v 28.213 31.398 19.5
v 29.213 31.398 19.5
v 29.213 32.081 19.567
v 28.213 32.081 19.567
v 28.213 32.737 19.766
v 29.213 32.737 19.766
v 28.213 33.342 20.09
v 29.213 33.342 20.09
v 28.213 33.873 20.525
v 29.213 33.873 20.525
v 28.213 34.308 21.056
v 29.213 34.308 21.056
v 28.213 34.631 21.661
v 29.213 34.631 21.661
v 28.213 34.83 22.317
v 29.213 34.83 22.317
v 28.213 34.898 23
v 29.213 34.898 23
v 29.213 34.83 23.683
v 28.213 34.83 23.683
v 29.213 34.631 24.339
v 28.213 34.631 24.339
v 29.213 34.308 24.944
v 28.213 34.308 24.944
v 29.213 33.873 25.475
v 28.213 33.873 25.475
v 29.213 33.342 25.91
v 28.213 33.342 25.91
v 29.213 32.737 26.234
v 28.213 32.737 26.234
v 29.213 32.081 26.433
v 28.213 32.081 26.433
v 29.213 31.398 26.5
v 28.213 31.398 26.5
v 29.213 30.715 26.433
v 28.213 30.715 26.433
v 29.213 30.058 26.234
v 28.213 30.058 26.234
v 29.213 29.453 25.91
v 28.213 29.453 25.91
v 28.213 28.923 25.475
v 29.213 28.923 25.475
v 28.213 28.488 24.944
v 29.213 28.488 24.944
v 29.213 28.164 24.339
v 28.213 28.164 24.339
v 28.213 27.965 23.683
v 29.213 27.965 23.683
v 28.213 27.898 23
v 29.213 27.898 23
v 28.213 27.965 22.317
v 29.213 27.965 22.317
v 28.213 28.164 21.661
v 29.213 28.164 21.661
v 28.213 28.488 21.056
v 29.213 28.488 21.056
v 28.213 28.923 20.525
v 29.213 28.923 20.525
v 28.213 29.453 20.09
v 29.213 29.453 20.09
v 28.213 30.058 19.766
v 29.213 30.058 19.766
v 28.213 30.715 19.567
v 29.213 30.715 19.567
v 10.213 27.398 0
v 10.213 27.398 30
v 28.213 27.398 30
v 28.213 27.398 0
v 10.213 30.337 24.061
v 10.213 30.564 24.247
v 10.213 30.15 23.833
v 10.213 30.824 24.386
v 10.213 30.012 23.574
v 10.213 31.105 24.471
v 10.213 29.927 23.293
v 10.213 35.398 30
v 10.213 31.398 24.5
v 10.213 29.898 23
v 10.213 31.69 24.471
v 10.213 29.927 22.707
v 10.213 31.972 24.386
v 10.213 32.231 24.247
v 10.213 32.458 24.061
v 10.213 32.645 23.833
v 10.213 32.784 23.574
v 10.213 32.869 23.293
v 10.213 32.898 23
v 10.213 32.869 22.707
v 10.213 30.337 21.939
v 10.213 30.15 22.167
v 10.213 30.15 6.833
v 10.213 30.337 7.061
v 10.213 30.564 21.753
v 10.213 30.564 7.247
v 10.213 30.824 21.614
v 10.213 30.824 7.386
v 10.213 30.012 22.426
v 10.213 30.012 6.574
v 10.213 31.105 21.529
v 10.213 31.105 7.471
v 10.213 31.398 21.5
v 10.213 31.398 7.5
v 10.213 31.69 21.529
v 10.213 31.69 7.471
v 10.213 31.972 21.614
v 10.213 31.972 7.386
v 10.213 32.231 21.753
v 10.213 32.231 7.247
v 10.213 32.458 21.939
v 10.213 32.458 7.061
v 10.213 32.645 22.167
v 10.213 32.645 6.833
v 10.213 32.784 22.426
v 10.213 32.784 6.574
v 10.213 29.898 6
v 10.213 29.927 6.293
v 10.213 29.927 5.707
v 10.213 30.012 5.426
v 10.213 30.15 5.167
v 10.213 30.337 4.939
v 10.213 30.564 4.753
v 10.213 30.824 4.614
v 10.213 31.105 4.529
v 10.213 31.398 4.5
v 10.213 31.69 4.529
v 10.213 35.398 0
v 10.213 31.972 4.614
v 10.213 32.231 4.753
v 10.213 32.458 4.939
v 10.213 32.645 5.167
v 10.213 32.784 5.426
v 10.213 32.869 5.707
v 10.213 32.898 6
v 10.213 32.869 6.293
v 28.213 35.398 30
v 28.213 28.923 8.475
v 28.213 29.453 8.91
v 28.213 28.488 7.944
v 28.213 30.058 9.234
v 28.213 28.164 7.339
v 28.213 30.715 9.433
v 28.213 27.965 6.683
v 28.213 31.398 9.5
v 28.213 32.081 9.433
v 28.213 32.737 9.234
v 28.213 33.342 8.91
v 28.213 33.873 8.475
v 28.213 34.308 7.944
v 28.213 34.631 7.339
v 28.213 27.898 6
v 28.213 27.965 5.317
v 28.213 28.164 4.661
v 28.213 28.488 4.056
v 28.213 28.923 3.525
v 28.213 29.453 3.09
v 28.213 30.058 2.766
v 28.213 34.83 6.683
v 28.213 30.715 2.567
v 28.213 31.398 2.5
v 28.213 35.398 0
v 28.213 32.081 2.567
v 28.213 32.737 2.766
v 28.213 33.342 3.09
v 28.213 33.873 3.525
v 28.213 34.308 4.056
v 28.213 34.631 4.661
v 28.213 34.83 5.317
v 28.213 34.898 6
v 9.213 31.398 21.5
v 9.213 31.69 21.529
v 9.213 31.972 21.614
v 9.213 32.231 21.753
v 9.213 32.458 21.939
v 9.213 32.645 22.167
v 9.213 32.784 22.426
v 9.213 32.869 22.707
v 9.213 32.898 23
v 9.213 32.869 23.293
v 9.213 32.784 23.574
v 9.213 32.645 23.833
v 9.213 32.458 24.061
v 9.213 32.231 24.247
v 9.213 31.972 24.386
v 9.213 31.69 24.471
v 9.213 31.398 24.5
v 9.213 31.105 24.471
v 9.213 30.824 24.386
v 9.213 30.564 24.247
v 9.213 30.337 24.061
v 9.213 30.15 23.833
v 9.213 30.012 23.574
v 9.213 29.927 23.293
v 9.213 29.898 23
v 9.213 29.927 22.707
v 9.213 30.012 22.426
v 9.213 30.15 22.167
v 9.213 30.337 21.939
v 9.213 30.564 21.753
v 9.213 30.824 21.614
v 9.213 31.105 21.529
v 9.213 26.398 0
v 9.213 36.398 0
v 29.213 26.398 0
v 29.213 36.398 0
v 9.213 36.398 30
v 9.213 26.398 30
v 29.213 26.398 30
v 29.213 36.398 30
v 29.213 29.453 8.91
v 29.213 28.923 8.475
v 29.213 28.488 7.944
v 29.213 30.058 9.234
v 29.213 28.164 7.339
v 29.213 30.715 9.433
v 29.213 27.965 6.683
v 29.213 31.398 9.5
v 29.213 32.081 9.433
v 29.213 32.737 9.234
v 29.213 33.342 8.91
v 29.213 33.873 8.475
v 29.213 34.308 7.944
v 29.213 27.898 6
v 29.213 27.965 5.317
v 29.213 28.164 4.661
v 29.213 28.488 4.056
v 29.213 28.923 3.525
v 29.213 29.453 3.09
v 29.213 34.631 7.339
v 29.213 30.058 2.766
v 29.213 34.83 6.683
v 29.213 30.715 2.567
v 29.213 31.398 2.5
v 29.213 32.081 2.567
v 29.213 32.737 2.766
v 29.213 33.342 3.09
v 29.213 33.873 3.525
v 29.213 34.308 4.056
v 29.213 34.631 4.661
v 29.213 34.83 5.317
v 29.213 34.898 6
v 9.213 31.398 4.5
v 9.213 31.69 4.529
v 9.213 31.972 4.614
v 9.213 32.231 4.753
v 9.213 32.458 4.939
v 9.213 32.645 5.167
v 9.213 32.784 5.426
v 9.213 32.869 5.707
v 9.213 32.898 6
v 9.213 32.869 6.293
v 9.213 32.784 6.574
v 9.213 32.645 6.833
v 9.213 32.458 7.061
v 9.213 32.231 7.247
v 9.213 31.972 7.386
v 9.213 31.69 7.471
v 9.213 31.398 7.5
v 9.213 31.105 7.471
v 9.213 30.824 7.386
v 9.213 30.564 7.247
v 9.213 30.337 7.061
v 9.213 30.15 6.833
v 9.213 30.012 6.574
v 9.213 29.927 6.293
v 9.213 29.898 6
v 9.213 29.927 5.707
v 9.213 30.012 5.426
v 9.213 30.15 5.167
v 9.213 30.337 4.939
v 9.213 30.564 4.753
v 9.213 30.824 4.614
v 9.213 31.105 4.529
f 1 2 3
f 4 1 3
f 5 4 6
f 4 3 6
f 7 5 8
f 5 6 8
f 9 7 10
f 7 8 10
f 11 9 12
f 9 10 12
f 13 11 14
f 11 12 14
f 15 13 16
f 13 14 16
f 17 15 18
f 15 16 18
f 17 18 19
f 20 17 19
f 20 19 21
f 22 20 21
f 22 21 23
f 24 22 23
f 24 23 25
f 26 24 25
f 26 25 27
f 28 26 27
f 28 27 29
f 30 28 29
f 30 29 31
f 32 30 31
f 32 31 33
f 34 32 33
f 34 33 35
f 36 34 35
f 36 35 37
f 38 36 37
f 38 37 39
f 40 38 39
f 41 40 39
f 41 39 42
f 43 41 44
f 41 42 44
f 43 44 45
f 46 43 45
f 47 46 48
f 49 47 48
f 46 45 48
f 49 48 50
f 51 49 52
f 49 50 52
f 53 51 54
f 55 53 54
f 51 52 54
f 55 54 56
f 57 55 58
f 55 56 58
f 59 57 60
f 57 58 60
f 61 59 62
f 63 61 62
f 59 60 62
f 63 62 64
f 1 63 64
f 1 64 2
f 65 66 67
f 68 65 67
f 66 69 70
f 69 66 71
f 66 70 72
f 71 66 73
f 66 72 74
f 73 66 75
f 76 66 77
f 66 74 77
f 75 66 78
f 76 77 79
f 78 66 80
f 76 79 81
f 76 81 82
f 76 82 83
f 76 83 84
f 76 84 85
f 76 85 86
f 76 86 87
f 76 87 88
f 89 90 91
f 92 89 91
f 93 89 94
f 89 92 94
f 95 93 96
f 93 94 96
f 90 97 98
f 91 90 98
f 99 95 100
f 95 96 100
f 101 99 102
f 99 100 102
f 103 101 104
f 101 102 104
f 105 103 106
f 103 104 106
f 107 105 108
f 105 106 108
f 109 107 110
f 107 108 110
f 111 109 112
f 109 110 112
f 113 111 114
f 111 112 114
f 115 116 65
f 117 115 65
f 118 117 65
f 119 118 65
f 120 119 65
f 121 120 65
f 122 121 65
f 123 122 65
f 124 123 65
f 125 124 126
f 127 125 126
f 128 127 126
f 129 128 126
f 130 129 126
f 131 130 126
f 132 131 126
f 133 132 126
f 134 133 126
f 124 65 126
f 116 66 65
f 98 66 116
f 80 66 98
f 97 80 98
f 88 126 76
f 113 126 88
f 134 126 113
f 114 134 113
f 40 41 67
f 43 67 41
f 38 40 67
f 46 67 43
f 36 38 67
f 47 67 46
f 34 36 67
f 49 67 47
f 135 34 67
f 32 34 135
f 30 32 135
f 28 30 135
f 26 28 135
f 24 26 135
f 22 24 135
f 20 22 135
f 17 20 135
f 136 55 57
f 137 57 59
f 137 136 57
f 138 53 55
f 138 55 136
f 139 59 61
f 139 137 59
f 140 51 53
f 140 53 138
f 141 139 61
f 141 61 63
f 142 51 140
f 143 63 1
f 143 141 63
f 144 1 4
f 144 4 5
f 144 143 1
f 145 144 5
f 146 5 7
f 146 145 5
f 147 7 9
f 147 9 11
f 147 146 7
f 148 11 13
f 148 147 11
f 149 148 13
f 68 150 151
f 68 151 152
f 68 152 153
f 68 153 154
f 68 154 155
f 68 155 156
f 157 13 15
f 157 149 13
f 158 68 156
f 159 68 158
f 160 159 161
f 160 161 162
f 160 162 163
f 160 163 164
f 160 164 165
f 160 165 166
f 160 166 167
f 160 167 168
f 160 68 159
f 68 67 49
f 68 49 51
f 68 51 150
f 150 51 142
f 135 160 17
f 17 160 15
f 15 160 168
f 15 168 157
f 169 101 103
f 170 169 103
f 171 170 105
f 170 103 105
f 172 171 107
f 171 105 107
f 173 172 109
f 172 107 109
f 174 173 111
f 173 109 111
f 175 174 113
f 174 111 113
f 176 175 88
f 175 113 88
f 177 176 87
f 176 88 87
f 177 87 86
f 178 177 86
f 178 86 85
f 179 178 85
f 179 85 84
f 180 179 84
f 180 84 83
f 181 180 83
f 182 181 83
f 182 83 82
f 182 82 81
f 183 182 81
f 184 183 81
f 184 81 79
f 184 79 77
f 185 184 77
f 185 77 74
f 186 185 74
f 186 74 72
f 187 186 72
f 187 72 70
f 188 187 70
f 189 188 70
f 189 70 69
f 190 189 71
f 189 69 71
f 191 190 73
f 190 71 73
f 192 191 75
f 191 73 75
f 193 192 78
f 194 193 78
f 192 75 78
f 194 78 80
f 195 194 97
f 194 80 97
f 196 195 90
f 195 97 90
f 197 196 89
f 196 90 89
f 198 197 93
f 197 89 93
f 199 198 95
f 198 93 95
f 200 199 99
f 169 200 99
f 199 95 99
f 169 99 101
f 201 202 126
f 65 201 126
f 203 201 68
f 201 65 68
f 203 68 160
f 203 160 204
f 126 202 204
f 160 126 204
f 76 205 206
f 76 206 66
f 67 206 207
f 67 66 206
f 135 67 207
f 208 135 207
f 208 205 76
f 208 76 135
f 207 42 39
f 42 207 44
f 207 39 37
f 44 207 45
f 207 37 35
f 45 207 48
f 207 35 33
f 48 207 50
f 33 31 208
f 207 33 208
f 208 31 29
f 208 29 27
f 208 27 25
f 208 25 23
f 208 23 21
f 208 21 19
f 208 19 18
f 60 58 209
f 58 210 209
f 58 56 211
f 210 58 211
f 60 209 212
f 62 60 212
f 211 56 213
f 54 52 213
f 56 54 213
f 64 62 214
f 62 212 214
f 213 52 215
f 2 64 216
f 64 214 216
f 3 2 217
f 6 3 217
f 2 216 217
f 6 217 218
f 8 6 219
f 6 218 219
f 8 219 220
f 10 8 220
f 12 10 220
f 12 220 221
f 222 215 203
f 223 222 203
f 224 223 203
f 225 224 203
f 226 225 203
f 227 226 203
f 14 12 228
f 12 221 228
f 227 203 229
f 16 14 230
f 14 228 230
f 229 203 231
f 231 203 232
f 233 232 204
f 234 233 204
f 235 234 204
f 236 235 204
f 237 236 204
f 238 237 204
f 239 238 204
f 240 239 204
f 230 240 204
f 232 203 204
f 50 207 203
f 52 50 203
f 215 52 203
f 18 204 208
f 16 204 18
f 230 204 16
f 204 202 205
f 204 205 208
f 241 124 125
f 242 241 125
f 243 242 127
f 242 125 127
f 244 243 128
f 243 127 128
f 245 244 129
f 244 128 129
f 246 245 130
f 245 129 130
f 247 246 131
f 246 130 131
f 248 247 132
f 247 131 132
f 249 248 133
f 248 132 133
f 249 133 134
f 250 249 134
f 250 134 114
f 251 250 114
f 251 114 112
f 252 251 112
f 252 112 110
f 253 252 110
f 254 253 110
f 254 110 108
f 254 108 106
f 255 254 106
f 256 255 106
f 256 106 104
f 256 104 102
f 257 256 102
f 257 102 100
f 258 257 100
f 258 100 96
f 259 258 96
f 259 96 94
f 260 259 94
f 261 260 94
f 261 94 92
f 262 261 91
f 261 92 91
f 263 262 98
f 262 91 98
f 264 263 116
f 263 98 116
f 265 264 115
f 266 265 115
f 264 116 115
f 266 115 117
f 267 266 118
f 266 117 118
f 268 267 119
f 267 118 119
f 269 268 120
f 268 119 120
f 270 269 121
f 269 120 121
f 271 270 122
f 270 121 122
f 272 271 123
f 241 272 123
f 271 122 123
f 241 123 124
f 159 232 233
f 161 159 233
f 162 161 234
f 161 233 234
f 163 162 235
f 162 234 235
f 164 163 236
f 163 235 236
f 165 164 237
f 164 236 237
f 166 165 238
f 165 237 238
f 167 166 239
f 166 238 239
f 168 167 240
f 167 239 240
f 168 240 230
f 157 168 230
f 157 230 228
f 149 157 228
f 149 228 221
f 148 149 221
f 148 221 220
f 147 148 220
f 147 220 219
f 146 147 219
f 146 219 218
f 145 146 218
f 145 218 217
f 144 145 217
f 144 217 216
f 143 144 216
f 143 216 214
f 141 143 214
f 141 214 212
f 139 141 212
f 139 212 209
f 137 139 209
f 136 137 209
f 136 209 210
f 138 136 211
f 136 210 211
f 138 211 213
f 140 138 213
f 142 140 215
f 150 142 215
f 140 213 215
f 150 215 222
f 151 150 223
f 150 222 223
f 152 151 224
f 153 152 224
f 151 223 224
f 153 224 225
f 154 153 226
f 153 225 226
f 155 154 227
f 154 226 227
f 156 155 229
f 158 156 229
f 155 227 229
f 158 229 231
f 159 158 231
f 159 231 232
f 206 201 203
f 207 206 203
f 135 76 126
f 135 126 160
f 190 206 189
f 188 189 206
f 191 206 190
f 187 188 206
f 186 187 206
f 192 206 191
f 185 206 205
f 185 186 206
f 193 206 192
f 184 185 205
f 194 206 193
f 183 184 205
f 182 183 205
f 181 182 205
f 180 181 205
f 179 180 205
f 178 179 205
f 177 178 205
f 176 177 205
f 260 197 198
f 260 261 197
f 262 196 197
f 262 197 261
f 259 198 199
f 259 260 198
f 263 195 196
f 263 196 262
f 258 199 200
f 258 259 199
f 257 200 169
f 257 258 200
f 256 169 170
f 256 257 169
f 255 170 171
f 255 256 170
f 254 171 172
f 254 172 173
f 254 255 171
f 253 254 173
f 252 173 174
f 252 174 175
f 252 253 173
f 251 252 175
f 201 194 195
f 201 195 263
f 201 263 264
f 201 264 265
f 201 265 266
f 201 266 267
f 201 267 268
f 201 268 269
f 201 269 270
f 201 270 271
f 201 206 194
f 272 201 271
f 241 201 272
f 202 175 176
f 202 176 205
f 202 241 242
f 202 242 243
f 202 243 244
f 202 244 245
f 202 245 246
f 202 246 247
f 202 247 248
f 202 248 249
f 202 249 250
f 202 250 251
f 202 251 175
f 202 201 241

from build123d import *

# Parameters (mm, degrees)
SKETCH_1_W          = 20
SKETCH_1_H          = 10
SKETCH_1_W_2        = 18
SKETCH_1_H_2        = 8
EXTRUDE_1_DEPTH     = 30
SKETCH_2_R          = 1.5
CUT_EXTRUDE_1_DEPTH = 20
SKETCH_3_R          = 3.5
CUT_EXTRUDE_2_DEPTH = 5


with BuildPart() as part:
    # 草图1 → 拉伸-薄壁1 (new body)
    with BuildSketch(Plane.XY):
        with Locations((19.212936099, 31.397704236)):
            Rectangle(SKETCH_1_W, SKETCH_1_H)
        with Locations((19.212936099, 31.397704236)):
            Rectangle(SKETCH_1_W_2, SKETCH_1_H_2, mode=Mode.SUBTRACT)
    extrude(amount=EXTRUDE_1_DEPTH)

    # 草图2 → 切除-拉伸1 (cut)
    with BuildSketch(Plane(origin=(29.212936099, 0, 0), x_dir=(0, 0, -1), z_dir=(1, 0, 0))):
        with Locations((-23, 31.397704236)):
            Circle(SKETCH_2_R)
        with Locations((-6, 31.397704236)):
            Circle(SKETCH_2_R)
    extrude(amount=-CUT_EXTRUDE_1_DEPTH, mode=Mode.SUBTRACT)

    # 草图3 → 切除-拉伸2 (cut)
    with BuildSketch(Plane(origin=(29.212936099, 0, 0), x_dir=(0, 0, -1), z_dir=(1, 0, 0))):
        with Locations((-23, 31.397704236)):
            Circle(SKETCH_3_R)
        with Locations((-6, 31.397704236)):
            Circle(SKETCH_3_R)
    extrude(amount=-CUT_EXTRUDE_2_DEPTH, mode=Mode.SUBTRACT)


solid = part.part
